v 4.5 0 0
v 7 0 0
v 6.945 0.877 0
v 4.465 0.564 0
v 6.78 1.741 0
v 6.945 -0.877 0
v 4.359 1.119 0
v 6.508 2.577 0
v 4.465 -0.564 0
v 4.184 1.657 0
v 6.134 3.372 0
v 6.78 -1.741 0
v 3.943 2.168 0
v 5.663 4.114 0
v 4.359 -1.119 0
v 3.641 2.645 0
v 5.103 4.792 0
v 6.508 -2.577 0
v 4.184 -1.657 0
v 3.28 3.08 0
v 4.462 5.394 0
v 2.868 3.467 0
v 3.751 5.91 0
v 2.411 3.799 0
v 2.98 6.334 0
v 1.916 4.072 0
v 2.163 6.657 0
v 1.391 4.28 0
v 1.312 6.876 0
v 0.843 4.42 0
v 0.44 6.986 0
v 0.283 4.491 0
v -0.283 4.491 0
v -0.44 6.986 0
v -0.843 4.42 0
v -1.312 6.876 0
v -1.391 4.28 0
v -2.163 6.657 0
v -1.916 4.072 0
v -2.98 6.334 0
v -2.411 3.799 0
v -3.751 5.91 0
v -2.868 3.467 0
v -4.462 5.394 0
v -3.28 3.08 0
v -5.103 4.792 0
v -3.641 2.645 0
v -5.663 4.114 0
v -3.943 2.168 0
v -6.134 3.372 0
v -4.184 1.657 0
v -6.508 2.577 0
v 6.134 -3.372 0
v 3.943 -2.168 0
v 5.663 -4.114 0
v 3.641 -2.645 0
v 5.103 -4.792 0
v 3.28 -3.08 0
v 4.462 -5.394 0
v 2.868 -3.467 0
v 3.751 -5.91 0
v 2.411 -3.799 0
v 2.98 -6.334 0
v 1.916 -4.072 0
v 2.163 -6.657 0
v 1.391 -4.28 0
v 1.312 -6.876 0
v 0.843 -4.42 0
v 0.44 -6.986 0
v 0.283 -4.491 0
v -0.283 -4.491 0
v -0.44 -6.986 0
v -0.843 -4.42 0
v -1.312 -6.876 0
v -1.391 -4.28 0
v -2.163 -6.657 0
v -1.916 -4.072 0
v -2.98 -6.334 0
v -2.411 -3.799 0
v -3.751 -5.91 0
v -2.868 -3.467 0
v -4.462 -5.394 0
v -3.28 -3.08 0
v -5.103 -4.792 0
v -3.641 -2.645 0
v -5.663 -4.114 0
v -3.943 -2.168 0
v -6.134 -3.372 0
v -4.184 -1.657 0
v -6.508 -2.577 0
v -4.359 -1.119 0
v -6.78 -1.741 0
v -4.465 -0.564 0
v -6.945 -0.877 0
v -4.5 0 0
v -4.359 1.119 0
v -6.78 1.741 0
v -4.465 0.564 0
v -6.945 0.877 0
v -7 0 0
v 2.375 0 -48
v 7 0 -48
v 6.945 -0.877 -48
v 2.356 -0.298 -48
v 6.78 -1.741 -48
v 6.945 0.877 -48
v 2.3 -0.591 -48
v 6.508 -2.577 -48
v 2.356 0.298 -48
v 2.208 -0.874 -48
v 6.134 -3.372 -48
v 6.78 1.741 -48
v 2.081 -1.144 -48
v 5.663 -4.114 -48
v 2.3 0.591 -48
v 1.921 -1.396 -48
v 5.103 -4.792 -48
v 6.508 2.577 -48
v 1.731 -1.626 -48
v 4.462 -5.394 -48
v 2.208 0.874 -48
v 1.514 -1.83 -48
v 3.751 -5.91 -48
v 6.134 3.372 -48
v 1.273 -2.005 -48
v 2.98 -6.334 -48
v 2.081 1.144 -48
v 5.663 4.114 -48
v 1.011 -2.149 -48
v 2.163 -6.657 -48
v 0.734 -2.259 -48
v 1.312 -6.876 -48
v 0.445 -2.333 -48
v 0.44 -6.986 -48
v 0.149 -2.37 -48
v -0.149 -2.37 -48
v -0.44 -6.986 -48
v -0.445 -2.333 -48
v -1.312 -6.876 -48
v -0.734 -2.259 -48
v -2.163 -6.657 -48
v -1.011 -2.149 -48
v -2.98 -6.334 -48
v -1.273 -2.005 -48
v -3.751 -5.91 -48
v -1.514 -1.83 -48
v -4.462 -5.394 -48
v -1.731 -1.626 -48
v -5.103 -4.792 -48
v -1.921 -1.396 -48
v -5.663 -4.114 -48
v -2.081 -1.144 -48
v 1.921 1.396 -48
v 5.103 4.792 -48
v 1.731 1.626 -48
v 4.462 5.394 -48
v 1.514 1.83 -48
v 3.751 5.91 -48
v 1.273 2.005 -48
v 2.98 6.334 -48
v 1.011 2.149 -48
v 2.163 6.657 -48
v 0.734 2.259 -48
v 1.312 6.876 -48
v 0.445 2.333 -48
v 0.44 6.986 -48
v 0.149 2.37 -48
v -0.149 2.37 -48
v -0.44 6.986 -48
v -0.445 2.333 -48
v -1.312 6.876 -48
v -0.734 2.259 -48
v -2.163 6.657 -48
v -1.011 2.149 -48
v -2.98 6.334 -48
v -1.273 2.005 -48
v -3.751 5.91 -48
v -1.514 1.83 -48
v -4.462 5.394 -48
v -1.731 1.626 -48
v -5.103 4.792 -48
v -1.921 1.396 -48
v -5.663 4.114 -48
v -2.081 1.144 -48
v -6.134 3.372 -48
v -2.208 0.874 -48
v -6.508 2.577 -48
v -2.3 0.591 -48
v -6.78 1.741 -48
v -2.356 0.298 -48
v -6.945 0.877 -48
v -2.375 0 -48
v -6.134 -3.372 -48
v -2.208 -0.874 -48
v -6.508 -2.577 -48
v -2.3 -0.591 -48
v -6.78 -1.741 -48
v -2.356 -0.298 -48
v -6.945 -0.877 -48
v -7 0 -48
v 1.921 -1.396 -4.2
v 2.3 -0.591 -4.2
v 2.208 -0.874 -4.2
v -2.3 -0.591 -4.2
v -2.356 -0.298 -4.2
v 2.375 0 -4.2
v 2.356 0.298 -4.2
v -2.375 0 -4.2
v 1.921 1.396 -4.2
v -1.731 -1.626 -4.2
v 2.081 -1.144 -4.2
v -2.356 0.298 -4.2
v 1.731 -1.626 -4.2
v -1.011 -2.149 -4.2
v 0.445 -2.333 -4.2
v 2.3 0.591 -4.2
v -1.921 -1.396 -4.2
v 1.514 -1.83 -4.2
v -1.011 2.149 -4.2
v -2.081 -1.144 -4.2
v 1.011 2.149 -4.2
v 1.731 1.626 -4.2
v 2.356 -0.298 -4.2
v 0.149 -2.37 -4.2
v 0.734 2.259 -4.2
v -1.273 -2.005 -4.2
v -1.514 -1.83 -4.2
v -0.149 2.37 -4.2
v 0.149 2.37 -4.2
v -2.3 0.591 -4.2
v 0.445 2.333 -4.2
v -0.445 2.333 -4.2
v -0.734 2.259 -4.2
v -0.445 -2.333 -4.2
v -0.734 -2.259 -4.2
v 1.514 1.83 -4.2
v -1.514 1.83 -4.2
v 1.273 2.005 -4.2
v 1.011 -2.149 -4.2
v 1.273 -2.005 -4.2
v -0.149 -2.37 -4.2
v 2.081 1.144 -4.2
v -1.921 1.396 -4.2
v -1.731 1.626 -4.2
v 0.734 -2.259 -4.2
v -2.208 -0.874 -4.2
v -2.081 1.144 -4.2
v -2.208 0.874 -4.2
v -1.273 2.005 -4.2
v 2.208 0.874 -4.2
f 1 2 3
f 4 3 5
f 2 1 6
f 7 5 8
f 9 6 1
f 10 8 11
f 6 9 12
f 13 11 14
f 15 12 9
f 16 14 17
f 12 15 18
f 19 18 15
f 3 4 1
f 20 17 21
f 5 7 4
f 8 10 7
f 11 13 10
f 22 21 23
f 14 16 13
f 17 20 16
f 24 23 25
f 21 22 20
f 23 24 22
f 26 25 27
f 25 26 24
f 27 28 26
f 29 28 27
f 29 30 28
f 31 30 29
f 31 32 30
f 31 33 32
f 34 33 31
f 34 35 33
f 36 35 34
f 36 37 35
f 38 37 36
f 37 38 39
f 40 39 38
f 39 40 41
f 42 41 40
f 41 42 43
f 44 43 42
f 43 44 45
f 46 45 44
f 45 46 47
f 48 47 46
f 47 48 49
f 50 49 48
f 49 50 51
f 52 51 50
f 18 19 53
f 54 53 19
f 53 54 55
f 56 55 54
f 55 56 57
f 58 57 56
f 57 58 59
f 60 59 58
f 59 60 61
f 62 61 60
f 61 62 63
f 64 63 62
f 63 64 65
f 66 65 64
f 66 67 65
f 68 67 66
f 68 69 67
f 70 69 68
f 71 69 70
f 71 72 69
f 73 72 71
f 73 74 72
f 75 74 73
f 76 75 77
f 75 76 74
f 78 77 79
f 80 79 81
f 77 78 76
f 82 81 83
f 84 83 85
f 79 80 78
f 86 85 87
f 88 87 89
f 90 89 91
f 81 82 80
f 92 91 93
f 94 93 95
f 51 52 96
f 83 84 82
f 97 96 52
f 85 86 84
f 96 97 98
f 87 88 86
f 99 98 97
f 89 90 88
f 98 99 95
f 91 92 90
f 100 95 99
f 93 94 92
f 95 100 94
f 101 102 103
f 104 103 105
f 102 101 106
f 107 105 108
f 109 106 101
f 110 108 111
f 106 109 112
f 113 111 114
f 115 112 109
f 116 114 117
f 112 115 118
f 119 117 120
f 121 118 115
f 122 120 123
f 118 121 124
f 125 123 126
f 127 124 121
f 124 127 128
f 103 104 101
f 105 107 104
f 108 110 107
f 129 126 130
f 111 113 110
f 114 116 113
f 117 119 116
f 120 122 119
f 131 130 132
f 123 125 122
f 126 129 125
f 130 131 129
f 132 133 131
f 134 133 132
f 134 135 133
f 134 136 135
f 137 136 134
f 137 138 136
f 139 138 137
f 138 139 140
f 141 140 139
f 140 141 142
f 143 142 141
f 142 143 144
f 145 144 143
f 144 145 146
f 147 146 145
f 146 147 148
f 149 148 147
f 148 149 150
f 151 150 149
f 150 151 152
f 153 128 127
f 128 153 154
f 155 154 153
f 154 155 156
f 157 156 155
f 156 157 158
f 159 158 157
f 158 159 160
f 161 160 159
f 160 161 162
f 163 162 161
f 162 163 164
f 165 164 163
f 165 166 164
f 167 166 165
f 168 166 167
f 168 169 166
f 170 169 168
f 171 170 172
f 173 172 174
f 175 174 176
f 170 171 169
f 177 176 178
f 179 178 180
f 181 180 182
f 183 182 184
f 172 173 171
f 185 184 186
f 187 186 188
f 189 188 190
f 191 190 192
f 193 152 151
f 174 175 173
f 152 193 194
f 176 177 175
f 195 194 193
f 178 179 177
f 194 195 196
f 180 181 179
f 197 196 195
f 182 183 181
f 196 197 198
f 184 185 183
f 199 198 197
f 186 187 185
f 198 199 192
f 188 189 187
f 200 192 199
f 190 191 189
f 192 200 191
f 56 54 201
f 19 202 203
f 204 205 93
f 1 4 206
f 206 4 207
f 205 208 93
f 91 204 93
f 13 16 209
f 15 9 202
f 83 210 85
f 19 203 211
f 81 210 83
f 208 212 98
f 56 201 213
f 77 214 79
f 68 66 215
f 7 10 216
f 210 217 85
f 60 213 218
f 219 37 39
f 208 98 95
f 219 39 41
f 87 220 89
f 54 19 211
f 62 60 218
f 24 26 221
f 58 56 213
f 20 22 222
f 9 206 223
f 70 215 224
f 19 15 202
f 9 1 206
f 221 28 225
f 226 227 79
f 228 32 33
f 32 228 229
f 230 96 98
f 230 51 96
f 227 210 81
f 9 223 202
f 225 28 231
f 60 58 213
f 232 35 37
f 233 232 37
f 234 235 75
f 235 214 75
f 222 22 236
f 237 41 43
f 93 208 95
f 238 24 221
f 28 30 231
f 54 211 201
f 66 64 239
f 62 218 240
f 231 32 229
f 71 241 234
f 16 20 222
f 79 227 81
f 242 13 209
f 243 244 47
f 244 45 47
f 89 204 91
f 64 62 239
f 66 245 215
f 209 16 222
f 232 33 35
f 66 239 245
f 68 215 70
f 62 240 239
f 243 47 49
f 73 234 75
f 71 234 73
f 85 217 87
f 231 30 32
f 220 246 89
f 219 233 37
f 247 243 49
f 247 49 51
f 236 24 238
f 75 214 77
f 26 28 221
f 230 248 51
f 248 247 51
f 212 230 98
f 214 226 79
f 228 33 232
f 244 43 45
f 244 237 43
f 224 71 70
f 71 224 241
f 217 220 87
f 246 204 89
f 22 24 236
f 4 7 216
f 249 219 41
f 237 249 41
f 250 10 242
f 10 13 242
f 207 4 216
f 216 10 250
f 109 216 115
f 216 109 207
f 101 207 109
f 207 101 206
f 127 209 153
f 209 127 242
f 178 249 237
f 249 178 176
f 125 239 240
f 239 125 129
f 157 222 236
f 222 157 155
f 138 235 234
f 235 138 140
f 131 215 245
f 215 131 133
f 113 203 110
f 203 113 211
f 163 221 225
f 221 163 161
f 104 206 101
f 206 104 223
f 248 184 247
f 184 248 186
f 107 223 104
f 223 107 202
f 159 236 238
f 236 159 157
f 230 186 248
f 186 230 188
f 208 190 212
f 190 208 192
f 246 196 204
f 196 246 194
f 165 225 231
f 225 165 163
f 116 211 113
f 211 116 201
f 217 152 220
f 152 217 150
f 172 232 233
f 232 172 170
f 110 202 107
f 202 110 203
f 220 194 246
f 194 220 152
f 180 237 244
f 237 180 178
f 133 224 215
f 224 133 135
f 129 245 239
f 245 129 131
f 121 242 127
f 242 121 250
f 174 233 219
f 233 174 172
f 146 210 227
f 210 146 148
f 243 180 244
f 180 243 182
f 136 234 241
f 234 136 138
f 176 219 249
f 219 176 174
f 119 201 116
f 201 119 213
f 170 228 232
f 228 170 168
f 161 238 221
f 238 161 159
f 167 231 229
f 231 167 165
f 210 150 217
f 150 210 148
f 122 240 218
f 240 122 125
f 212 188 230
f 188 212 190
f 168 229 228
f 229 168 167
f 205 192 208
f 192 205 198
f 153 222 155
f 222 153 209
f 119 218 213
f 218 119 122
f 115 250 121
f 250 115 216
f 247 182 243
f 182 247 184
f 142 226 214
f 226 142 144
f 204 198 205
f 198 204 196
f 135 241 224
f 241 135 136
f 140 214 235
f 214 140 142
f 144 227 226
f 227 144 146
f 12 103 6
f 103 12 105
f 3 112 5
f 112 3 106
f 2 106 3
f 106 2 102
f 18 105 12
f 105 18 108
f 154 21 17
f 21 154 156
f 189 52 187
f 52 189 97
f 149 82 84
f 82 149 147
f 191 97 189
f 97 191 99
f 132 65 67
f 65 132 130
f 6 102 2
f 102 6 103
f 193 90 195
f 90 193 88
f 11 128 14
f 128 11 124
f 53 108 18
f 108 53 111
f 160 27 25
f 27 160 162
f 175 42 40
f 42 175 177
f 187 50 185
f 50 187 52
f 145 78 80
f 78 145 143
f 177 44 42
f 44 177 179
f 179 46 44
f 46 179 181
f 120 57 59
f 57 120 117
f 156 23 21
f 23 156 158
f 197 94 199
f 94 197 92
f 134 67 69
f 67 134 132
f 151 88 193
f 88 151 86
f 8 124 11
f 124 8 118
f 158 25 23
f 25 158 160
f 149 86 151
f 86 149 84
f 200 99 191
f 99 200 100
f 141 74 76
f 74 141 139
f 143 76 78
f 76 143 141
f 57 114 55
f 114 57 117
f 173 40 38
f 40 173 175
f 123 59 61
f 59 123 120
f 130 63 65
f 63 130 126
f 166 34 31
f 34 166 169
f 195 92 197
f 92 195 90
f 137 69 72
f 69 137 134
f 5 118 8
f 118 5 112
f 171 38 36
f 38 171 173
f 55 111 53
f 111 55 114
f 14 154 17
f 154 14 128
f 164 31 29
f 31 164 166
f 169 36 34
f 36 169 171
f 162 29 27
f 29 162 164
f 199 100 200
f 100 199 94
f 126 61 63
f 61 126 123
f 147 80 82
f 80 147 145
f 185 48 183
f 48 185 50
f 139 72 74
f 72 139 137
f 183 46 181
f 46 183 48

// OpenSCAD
$fn = 50;


difference() {
	union() {
		translate(v = [0, 0, -48.0000000000]) {
			cylinder(h = 48, r = 7.0000000000);
		}
	}
	union() {
		translate(v = [0, 0, 0]) {
			rotate(a = [0, 0, 0]) {
				difference() {
					union() {
						#translate(v = [0, 0, -48.0000000000]) {
							cylinder(h = 48, r = 2.2500000000);
						}
						#translate(v = [0, 0, -4.2000000000]) {
							cylinder(h = 4.2000000000, r1 = 2.3750000000, r2 = 4.5000000000);
						}
						#translate(v = [0, 0, -48.0000000000]) {
							cylinder(h = 48, r = 2.3750000000);
						}
						#translate(v = [0, 0, -48.0000000000]) {
							cylinder(h = 48, r = 2.2500000000);
						}
					}
					union();
				}
			}
		}
	}
}
